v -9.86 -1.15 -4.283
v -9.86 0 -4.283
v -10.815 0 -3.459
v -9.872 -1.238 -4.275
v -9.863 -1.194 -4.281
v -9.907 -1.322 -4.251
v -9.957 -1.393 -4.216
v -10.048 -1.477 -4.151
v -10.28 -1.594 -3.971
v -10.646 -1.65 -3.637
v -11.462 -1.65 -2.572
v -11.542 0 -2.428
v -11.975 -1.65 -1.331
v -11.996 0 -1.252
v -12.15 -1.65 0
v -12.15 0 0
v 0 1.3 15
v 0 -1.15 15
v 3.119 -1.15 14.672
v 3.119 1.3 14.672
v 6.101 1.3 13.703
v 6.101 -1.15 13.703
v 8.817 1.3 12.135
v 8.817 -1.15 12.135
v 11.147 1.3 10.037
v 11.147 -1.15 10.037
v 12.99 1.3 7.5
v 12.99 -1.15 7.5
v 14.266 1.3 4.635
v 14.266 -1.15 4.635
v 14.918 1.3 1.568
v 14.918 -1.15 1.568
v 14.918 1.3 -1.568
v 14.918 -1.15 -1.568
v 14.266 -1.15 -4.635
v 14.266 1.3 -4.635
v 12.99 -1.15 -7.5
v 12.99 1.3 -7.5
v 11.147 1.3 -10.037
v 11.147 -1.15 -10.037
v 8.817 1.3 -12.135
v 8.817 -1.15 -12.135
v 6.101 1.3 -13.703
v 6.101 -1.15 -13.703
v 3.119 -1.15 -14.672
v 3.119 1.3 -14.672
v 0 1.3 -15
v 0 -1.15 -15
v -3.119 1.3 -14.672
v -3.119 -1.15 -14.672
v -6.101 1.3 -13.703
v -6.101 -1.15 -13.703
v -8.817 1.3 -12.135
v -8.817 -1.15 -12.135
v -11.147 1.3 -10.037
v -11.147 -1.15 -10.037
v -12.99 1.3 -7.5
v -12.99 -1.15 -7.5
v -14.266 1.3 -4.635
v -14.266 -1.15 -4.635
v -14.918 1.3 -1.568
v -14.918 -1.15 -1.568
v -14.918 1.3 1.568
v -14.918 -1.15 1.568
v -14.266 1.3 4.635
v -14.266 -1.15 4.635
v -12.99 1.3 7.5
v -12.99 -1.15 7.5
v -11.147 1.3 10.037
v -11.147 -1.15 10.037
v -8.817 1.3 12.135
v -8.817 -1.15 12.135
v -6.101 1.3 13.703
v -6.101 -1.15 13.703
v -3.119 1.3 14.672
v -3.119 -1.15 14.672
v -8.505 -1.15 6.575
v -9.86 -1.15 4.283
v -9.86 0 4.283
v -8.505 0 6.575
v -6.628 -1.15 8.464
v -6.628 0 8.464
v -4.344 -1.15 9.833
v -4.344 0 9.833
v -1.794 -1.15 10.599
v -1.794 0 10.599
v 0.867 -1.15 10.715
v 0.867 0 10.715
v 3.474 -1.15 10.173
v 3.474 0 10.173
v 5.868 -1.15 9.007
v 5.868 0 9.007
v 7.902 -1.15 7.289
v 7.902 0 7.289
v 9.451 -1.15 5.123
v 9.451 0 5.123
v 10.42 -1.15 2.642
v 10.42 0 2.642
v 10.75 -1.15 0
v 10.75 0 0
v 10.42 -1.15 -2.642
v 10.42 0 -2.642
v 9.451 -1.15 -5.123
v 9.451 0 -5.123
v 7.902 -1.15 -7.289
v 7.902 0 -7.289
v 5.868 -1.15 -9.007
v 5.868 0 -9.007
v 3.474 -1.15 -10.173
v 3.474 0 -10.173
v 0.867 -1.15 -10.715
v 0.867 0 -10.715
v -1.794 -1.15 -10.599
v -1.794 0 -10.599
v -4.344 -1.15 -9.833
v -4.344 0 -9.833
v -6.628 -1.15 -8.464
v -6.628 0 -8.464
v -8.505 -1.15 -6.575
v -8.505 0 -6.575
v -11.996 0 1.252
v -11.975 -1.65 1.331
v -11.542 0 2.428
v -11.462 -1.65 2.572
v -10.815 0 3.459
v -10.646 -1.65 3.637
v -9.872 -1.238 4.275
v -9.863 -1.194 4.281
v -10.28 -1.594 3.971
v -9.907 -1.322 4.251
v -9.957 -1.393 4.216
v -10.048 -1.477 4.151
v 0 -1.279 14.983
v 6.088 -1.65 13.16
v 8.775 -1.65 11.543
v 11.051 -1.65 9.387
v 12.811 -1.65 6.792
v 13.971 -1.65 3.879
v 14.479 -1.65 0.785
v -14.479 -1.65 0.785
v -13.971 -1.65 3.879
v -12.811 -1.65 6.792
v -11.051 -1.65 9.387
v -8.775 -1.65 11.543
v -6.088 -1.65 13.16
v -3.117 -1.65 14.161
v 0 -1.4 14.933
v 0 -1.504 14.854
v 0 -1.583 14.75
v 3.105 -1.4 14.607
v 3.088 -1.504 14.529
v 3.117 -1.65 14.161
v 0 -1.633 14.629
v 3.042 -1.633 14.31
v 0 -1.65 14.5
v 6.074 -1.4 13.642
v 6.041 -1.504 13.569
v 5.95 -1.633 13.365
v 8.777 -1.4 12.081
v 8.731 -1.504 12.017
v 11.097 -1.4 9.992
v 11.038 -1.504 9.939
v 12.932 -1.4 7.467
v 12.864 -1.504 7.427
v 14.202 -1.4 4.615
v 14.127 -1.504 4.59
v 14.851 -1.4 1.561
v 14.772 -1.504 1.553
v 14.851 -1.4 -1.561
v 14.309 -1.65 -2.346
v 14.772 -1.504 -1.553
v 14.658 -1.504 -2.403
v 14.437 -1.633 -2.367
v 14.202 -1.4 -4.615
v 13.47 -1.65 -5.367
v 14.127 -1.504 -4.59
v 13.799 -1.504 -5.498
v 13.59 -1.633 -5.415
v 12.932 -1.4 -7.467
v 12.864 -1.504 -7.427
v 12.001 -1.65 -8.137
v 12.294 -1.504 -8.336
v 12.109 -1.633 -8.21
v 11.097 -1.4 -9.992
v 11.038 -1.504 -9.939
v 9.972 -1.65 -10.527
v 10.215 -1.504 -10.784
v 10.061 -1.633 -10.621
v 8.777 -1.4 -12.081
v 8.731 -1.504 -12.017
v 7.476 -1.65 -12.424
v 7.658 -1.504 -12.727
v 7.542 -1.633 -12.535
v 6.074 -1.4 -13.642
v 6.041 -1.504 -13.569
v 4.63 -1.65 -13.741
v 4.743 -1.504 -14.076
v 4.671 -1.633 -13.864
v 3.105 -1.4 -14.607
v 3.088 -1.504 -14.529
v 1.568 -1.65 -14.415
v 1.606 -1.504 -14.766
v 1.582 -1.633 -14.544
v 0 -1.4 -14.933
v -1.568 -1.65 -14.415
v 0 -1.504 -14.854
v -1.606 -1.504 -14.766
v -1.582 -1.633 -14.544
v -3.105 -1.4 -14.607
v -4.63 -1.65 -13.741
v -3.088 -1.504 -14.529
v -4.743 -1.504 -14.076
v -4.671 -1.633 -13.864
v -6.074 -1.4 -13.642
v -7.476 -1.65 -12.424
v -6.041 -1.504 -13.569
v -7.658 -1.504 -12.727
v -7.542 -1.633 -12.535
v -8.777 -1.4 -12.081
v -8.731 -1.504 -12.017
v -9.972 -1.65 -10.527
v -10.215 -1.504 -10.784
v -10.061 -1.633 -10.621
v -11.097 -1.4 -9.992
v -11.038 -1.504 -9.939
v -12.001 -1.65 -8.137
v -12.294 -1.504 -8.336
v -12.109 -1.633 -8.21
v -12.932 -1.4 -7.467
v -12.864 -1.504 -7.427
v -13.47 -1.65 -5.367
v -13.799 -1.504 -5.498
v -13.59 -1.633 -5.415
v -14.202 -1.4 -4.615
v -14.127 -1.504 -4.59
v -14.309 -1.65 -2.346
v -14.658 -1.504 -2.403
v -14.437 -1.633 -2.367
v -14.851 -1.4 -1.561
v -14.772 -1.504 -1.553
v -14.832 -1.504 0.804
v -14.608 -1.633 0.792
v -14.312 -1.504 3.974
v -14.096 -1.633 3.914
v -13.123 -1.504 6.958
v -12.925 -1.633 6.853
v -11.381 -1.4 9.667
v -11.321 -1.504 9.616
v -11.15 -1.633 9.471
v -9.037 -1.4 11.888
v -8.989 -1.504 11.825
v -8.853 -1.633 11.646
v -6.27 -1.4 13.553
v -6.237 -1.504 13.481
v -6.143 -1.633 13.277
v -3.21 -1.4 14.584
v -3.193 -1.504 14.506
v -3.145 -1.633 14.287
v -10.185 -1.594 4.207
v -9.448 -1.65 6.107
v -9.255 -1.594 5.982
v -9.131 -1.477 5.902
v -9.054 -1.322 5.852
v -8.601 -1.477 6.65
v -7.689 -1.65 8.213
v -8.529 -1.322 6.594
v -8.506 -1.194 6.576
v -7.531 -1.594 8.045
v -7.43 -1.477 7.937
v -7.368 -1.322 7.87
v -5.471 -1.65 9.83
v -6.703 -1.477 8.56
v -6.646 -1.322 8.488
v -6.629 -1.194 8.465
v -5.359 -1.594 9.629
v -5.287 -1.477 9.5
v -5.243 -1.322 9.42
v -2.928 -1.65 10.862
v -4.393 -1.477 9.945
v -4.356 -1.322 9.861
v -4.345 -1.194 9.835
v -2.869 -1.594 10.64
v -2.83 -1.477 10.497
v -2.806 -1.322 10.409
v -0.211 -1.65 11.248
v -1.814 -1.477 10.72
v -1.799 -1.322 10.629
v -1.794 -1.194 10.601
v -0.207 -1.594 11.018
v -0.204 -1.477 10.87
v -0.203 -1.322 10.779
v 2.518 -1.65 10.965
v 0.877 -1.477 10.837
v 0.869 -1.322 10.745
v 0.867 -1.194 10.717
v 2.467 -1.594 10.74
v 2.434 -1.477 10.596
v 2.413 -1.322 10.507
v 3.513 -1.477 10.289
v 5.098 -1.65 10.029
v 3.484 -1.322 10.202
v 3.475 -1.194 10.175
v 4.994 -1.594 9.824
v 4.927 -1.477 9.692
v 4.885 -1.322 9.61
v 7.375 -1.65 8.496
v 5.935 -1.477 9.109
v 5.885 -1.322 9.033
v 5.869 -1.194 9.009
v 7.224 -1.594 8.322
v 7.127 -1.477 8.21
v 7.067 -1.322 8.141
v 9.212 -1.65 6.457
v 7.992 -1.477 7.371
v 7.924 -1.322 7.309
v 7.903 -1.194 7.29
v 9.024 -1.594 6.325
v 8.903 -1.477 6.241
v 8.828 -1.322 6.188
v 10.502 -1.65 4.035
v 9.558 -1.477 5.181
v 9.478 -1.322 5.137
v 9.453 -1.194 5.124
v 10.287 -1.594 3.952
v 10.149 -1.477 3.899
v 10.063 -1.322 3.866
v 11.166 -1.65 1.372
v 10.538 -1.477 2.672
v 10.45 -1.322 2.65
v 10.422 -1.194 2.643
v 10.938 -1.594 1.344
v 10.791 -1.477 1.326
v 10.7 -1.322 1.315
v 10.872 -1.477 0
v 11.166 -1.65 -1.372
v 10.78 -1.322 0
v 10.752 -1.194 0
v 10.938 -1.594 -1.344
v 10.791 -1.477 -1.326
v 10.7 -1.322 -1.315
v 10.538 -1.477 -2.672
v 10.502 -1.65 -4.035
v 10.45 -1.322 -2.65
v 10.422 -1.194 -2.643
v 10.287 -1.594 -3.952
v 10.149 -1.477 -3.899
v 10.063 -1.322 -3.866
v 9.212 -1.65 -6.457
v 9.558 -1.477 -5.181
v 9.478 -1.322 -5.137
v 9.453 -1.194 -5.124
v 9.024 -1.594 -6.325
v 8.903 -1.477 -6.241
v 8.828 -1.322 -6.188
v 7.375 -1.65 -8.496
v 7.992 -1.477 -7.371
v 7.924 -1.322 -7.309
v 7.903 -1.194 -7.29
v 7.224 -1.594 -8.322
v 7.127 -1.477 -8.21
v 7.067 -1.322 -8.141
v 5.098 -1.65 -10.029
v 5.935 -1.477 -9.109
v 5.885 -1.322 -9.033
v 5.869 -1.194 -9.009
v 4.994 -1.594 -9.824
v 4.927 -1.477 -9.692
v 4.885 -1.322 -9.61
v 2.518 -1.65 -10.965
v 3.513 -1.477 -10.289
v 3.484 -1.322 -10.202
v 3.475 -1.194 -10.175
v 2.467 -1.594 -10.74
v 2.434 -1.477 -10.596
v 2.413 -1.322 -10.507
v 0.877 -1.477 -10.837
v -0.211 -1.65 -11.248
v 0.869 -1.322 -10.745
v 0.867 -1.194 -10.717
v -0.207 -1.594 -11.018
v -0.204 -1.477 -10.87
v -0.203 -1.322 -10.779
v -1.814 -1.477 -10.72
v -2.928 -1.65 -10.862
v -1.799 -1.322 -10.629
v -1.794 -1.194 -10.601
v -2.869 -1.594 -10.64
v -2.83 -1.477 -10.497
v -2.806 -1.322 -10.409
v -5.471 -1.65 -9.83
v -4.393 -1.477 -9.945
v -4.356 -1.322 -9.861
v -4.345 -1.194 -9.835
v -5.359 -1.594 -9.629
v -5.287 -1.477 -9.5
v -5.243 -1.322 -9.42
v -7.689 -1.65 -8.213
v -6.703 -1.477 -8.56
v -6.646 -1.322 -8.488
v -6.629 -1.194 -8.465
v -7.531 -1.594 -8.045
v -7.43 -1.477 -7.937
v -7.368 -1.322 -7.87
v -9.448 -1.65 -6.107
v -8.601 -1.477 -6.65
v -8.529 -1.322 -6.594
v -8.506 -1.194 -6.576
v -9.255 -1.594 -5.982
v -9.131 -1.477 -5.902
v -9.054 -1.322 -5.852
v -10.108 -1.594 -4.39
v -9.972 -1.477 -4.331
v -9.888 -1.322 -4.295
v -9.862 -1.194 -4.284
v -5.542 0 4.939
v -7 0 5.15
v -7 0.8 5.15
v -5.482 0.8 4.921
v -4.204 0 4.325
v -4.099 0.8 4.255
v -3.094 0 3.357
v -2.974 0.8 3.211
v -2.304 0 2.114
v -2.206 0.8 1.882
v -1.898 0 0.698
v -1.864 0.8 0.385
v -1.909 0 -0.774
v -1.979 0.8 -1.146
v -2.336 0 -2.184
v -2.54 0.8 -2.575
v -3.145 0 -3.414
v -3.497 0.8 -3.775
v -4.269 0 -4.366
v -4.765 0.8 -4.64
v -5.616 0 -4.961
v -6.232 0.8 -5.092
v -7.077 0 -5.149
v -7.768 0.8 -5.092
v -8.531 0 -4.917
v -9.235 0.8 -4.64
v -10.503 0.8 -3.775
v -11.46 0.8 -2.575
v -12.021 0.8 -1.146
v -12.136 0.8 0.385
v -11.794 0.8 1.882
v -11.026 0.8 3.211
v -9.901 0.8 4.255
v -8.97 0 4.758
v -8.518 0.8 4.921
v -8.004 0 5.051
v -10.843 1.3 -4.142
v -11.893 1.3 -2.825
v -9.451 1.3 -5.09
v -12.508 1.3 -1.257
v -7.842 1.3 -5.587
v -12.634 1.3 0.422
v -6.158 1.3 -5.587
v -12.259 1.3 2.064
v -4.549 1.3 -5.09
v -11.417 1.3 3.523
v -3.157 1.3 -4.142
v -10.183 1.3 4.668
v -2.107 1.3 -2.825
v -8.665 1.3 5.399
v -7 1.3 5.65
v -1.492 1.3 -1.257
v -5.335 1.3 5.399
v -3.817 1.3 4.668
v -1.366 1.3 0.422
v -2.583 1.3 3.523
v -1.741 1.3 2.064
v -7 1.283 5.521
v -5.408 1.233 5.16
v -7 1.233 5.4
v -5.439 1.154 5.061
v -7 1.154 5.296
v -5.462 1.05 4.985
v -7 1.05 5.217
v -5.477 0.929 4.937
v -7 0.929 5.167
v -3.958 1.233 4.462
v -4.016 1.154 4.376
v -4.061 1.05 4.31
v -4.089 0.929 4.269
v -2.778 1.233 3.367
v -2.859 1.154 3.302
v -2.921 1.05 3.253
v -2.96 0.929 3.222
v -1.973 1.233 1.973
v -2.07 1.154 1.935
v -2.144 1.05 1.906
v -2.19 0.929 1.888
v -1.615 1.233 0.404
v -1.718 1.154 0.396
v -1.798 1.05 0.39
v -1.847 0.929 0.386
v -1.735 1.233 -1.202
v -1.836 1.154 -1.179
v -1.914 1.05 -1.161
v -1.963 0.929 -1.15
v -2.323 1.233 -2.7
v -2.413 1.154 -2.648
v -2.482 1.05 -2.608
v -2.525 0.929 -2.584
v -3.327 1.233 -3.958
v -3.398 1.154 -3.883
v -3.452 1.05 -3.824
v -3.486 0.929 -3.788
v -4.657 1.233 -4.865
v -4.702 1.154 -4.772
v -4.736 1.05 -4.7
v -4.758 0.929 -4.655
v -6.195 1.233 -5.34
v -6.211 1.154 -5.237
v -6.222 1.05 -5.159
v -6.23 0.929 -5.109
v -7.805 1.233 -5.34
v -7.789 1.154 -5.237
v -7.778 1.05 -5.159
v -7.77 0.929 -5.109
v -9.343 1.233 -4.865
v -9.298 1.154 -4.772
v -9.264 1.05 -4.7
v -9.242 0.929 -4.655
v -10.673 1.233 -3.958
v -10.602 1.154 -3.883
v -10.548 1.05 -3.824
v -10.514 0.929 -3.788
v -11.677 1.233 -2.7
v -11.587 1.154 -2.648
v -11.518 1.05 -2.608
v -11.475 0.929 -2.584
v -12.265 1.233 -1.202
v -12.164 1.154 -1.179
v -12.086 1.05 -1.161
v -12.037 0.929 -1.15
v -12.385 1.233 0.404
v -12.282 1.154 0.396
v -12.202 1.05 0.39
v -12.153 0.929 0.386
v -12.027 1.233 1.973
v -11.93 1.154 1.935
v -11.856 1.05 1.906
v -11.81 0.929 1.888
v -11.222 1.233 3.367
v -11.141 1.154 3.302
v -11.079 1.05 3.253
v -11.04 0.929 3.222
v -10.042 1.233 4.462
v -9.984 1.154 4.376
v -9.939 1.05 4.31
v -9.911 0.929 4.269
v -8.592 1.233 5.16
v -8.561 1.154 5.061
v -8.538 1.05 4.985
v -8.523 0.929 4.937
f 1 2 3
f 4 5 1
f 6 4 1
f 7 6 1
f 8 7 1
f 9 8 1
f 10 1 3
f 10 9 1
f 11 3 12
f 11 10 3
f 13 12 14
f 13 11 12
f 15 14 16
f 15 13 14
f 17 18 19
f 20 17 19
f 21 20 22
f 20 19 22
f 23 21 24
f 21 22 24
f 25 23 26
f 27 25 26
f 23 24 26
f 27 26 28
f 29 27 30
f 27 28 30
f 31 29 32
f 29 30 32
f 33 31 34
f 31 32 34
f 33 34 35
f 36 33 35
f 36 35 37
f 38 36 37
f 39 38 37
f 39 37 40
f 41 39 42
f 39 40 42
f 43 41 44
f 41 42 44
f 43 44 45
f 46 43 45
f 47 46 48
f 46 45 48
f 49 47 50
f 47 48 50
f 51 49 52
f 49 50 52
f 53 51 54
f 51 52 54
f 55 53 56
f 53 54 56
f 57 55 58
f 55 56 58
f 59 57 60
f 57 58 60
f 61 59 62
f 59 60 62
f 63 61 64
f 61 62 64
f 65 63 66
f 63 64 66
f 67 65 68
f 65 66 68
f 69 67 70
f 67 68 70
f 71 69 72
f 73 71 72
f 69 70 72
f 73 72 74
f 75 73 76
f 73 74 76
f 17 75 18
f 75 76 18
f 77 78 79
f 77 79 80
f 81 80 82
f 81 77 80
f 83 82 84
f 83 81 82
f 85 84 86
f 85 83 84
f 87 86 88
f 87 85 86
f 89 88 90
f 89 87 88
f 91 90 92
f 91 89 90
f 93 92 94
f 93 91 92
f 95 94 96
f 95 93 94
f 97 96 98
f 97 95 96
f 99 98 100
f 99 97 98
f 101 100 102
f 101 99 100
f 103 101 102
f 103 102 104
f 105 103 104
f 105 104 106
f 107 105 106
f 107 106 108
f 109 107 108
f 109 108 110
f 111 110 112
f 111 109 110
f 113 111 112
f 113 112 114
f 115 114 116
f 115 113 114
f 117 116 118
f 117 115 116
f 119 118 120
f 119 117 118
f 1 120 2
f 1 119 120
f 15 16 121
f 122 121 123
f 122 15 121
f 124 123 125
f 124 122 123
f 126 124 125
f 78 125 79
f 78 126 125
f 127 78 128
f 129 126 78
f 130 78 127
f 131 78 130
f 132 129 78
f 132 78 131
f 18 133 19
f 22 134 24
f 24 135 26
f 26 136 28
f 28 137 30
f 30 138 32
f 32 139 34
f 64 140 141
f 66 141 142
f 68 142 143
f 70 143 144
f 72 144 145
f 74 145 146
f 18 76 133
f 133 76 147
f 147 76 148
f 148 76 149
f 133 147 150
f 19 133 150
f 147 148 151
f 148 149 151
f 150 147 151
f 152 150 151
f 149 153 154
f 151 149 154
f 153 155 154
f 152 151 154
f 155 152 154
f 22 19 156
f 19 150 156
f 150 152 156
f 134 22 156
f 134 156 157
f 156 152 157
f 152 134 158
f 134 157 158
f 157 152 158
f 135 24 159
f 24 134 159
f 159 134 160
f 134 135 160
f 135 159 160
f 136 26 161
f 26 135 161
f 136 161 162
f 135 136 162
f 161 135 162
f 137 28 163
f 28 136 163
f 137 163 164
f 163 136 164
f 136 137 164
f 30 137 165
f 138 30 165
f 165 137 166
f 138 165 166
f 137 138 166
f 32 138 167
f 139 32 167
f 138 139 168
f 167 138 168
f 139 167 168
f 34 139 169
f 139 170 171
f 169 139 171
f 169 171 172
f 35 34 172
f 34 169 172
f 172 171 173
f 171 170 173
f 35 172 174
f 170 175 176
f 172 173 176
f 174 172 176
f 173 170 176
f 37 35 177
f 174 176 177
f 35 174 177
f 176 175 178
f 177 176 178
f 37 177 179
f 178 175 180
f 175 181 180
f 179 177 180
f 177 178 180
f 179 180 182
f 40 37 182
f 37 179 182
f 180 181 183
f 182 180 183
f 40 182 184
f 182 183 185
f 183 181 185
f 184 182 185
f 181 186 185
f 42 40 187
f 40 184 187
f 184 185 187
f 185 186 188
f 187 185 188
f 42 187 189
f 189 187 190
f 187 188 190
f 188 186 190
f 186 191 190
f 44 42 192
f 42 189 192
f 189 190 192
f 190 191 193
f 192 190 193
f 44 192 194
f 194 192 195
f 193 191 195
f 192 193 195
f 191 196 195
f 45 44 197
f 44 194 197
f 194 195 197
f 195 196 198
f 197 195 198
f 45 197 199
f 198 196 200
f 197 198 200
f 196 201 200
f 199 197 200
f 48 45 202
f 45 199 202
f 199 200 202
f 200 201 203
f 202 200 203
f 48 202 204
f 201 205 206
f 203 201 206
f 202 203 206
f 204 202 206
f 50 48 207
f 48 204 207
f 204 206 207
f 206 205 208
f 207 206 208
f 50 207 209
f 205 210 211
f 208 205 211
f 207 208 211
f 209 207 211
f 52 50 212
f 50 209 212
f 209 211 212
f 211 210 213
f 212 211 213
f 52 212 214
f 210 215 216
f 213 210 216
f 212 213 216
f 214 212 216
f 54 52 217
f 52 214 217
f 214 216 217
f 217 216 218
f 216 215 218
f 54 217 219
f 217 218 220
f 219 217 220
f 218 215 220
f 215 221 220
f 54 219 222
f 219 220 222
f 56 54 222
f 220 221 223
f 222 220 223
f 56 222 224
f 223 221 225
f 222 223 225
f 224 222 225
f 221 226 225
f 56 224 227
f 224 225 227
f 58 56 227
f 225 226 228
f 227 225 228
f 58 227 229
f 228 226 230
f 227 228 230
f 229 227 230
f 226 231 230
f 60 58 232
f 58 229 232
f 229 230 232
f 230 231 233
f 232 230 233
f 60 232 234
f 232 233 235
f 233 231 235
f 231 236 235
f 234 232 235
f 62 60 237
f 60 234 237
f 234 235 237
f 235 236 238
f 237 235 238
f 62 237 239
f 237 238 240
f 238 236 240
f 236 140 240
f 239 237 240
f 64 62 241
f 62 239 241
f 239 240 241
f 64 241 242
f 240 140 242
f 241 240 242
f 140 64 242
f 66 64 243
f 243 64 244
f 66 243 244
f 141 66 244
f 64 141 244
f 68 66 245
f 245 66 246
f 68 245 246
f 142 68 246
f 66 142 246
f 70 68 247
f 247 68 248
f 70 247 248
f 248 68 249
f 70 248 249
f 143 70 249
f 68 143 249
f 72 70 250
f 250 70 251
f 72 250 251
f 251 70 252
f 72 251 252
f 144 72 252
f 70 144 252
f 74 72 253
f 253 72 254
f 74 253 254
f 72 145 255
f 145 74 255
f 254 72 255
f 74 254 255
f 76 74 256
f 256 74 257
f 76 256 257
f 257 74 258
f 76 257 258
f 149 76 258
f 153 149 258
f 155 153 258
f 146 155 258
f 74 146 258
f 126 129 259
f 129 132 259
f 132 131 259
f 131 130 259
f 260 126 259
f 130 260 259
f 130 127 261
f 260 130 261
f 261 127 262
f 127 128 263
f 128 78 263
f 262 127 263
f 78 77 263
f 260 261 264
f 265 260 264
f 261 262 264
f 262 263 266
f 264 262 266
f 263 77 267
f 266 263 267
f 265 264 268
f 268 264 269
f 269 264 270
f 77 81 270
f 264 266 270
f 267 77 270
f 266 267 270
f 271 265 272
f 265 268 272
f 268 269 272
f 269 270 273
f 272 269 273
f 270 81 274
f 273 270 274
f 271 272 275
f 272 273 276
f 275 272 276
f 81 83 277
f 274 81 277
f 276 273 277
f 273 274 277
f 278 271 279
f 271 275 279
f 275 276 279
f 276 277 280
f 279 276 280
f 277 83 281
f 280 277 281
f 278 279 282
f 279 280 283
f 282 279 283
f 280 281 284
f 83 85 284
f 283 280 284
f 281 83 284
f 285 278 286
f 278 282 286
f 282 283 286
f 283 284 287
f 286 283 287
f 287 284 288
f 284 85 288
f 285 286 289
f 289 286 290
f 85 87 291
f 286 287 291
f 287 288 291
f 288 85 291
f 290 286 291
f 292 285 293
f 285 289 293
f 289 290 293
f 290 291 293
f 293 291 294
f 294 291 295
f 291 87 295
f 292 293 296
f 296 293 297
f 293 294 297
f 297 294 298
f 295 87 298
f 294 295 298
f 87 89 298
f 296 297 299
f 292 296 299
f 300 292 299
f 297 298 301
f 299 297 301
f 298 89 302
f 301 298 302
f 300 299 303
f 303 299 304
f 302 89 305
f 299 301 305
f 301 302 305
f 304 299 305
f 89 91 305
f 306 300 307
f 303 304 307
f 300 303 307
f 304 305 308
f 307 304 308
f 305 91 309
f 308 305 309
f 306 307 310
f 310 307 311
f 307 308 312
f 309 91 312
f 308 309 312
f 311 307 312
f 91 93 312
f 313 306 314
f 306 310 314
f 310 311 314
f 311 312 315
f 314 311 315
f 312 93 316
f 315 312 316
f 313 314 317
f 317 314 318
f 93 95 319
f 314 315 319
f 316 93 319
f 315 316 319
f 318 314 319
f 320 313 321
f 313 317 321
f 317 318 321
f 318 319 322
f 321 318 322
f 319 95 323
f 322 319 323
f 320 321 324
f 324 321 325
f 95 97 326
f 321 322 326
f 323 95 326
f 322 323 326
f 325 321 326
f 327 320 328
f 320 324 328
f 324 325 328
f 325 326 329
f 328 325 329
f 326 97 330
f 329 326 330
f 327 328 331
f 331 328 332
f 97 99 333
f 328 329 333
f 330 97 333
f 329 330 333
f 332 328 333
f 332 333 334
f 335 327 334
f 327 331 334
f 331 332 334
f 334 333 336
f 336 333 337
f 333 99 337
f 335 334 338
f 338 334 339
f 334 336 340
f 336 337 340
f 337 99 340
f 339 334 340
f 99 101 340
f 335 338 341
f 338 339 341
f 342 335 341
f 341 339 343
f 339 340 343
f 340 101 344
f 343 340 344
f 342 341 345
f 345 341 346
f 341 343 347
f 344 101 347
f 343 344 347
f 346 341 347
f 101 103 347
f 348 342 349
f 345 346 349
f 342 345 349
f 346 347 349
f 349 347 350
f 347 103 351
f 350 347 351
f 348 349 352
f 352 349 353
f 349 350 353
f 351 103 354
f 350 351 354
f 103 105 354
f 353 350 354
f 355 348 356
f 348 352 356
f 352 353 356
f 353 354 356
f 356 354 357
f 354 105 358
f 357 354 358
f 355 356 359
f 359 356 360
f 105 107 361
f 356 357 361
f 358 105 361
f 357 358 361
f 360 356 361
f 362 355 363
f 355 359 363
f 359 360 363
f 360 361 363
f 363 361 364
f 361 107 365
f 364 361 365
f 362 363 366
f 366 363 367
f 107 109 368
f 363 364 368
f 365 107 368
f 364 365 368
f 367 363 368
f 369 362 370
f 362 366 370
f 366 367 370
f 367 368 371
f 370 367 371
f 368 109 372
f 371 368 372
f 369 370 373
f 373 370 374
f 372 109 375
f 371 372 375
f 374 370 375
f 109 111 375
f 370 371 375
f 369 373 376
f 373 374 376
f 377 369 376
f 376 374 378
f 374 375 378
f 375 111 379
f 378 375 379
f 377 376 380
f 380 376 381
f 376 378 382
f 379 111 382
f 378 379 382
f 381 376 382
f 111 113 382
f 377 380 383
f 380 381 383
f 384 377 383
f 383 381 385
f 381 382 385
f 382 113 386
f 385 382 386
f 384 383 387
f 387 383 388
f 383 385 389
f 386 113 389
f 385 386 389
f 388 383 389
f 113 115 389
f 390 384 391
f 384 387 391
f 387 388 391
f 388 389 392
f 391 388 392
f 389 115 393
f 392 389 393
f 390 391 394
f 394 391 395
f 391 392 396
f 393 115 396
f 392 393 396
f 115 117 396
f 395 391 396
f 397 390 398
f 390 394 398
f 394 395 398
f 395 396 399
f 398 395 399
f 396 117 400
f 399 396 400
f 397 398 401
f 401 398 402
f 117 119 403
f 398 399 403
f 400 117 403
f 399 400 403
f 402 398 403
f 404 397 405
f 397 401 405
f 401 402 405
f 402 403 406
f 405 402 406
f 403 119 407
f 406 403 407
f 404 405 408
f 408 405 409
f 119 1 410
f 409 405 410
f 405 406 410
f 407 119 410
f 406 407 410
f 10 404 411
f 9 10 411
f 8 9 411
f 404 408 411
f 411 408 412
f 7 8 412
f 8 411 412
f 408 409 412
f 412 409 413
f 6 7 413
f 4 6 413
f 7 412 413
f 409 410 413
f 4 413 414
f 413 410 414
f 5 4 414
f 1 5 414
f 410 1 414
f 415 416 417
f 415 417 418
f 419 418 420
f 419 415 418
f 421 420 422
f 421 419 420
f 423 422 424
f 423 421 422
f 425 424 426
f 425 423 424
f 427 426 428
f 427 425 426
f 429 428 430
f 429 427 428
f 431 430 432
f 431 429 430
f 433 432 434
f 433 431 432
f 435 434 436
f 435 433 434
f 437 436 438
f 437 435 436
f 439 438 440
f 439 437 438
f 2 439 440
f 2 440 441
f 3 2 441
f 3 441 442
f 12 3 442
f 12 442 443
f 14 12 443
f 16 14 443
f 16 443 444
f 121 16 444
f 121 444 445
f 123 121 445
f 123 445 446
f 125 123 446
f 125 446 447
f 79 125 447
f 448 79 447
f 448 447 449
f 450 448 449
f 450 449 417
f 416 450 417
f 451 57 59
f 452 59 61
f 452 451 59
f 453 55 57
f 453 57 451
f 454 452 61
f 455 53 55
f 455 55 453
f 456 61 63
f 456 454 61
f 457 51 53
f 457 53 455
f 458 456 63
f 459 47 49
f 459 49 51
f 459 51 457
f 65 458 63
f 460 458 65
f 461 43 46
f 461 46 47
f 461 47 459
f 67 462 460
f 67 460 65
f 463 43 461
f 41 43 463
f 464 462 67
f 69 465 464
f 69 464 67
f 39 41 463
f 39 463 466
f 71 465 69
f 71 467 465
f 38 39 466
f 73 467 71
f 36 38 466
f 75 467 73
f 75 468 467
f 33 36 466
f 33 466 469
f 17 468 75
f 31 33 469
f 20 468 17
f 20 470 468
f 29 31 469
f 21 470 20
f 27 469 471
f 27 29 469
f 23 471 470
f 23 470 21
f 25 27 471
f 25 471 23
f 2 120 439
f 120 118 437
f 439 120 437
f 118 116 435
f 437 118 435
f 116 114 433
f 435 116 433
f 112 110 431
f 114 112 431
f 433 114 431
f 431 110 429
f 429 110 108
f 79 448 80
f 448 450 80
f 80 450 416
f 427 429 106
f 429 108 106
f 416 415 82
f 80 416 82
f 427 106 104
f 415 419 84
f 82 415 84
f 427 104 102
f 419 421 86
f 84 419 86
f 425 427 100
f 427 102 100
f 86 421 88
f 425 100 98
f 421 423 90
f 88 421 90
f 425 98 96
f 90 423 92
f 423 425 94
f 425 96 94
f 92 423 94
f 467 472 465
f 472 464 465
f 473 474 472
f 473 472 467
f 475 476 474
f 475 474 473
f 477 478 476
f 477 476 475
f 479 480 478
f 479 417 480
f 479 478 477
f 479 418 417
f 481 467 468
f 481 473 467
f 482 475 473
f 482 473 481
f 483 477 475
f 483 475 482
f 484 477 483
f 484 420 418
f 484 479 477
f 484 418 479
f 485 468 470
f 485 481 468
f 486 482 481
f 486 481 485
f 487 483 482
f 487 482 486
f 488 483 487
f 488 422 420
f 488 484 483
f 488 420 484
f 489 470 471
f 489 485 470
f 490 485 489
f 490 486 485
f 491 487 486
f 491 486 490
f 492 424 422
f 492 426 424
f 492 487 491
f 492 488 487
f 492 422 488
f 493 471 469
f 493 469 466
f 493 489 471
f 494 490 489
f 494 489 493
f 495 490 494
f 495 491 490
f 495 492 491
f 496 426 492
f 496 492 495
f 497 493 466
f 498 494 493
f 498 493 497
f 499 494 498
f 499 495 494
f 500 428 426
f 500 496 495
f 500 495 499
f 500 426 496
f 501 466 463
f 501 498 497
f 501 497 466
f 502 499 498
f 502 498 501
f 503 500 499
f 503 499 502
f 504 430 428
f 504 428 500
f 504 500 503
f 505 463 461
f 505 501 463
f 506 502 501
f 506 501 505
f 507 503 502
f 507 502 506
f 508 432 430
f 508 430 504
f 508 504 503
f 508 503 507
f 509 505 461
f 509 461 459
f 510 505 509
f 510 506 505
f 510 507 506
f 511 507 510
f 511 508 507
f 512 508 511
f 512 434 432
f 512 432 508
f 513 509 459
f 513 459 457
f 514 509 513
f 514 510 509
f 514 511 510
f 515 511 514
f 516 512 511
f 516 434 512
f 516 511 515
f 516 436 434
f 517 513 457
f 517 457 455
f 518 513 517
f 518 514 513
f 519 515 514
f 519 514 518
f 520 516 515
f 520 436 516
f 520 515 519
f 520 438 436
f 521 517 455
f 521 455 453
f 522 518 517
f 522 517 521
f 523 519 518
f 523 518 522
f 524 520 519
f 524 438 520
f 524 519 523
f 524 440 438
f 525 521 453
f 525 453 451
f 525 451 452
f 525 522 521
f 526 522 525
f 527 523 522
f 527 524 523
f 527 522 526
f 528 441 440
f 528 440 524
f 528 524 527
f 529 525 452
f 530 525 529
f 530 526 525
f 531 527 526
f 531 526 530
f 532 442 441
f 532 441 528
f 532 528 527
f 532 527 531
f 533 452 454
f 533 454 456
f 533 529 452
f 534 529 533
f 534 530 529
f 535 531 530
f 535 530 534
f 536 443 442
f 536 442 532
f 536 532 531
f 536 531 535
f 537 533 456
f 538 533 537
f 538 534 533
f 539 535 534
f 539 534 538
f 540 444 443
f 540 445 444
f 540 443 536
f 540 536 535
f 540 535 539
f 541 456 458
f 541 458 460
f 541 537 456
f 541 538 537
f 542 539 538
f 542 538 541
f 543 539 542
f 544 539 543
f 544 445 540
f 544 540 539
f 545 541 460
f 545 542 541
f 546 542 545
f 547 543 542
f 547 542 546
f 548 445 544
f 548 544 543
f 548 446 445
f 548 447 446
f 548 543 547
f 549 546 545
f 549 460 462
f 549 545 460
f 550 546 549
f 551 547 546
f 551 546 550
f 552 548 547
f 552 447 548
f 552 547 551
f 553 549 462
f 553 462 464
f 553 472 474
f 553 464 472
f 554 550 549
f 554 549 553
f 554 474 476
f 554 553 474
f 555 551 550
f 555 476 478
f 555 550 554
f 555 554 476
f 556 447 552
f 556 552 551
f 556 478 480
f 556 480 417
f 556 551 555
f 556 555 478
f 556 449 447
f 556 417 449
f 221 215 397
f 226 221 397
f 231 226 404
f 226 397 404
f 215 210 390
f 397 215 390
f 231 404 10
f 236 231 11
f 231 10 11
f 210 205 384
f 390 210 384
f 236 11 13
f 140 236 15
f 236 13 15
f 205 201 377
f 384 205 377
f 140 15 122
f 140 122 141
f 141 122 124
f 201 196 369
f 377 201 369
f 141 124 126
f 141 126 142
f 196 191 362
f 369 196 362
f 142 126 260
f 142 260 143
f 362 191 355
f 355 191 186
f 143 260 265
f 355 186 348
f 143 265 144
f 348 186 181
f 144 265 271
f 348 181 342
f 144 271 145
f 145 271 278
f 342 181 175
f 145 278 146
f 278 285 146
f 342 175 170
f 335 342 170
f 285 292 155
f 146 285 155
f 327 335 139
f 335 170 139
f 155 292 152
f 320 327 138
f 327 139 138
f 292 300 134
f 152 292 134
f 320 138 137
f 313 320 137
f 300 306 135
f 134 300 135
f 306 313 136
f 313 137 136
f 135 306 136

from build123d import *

# Parameters (mm, degrees)
SKETCH1_R           = 15
SKETCH1_R_2         = 5.15
BOSS_EXTRUDE1_DEPTH = 1.3
BOSS_EXTRUDE2_START = -1.65
SKETCH1_3_R         = 15
SKETCH1_3_R_2       = 10.75
BOSS_EXTRUDE2_DEPTH = 1.65
CUT_EXTRUDE1_START  = -1.65
CUT_EXTRUDE1_DEPTH  = 1.65
FILLET5_R           = 0.5
FILLET6_R           = 0.5


with BuildPart() as part:
    # Sketch1 → Boss-Extrude1 (new body)
    with BuildSketch(Plane(origin=(0, 0, 0), x_dir=(1, 0, 0), z_dir=(0, 1, 0))):
        Circle(SKETCH1_R)
        with Locations((-7, 0)):
            Circle(SKETCH1_R_2, mode=Mode.SUBTRACT)
    extrude(amount=BOSS_EXTRUDE1_DEPTH)

    # Sketch1<3> → Boss-Extrude2 (add)
    with BuildSketch(Plane(origin=(0, 0, 0), x_dir=(1, 0, 0), z_dir=(0, 1, 0)).offset(BOSS_EXTRUDE2_START)):
        Circle(SKETCH1_3_R)
        Circle(SKETCH1_3_R_2, mode=Mode.SUBTRACT)
    extrude(amount=BOSS_EXTRUDE2_DEPTH)

    # Sketch1<4> → Cut-Extrude1 (cut)
    with BuildSketch(Plane(origin=(0, 0, 0), x_dir=(1, 0, 0), z_dir=(0, 1, 0)).offset(CUT_EXTRUDE1_START)):
        with BuildLine():
            ThreePointArc((-9.86, -4.282861193), (-10.75, 0), (-9.86, 4.282861193))
            ThreePointArc((-9.86, 4.282861193), (-12.15, 0), (-9.86, -4.282861193))
        make_face()
    extrude(amount=CUT_EXTRUDE1_DEPTH, mode=Mode.SUBTRACT)

    # Fillet5
    fillet5_edges = [part.edges().sort_by_distance(p)[0] for p in [
        (-12.15, 1.3, 0),
    ]]
    fillet(fillet5_edges, radius=FILLET5_R)

    # Fillet6
    fillet6_edges = [part.edges().sort_by_distance(p)[0] for p in [
        (10.75, -1.65, 0),
        (-15, -1.65, 0),
    ]]
    fillet(fillet6_edges, radius=FILLET6_R)


solid = part.part
